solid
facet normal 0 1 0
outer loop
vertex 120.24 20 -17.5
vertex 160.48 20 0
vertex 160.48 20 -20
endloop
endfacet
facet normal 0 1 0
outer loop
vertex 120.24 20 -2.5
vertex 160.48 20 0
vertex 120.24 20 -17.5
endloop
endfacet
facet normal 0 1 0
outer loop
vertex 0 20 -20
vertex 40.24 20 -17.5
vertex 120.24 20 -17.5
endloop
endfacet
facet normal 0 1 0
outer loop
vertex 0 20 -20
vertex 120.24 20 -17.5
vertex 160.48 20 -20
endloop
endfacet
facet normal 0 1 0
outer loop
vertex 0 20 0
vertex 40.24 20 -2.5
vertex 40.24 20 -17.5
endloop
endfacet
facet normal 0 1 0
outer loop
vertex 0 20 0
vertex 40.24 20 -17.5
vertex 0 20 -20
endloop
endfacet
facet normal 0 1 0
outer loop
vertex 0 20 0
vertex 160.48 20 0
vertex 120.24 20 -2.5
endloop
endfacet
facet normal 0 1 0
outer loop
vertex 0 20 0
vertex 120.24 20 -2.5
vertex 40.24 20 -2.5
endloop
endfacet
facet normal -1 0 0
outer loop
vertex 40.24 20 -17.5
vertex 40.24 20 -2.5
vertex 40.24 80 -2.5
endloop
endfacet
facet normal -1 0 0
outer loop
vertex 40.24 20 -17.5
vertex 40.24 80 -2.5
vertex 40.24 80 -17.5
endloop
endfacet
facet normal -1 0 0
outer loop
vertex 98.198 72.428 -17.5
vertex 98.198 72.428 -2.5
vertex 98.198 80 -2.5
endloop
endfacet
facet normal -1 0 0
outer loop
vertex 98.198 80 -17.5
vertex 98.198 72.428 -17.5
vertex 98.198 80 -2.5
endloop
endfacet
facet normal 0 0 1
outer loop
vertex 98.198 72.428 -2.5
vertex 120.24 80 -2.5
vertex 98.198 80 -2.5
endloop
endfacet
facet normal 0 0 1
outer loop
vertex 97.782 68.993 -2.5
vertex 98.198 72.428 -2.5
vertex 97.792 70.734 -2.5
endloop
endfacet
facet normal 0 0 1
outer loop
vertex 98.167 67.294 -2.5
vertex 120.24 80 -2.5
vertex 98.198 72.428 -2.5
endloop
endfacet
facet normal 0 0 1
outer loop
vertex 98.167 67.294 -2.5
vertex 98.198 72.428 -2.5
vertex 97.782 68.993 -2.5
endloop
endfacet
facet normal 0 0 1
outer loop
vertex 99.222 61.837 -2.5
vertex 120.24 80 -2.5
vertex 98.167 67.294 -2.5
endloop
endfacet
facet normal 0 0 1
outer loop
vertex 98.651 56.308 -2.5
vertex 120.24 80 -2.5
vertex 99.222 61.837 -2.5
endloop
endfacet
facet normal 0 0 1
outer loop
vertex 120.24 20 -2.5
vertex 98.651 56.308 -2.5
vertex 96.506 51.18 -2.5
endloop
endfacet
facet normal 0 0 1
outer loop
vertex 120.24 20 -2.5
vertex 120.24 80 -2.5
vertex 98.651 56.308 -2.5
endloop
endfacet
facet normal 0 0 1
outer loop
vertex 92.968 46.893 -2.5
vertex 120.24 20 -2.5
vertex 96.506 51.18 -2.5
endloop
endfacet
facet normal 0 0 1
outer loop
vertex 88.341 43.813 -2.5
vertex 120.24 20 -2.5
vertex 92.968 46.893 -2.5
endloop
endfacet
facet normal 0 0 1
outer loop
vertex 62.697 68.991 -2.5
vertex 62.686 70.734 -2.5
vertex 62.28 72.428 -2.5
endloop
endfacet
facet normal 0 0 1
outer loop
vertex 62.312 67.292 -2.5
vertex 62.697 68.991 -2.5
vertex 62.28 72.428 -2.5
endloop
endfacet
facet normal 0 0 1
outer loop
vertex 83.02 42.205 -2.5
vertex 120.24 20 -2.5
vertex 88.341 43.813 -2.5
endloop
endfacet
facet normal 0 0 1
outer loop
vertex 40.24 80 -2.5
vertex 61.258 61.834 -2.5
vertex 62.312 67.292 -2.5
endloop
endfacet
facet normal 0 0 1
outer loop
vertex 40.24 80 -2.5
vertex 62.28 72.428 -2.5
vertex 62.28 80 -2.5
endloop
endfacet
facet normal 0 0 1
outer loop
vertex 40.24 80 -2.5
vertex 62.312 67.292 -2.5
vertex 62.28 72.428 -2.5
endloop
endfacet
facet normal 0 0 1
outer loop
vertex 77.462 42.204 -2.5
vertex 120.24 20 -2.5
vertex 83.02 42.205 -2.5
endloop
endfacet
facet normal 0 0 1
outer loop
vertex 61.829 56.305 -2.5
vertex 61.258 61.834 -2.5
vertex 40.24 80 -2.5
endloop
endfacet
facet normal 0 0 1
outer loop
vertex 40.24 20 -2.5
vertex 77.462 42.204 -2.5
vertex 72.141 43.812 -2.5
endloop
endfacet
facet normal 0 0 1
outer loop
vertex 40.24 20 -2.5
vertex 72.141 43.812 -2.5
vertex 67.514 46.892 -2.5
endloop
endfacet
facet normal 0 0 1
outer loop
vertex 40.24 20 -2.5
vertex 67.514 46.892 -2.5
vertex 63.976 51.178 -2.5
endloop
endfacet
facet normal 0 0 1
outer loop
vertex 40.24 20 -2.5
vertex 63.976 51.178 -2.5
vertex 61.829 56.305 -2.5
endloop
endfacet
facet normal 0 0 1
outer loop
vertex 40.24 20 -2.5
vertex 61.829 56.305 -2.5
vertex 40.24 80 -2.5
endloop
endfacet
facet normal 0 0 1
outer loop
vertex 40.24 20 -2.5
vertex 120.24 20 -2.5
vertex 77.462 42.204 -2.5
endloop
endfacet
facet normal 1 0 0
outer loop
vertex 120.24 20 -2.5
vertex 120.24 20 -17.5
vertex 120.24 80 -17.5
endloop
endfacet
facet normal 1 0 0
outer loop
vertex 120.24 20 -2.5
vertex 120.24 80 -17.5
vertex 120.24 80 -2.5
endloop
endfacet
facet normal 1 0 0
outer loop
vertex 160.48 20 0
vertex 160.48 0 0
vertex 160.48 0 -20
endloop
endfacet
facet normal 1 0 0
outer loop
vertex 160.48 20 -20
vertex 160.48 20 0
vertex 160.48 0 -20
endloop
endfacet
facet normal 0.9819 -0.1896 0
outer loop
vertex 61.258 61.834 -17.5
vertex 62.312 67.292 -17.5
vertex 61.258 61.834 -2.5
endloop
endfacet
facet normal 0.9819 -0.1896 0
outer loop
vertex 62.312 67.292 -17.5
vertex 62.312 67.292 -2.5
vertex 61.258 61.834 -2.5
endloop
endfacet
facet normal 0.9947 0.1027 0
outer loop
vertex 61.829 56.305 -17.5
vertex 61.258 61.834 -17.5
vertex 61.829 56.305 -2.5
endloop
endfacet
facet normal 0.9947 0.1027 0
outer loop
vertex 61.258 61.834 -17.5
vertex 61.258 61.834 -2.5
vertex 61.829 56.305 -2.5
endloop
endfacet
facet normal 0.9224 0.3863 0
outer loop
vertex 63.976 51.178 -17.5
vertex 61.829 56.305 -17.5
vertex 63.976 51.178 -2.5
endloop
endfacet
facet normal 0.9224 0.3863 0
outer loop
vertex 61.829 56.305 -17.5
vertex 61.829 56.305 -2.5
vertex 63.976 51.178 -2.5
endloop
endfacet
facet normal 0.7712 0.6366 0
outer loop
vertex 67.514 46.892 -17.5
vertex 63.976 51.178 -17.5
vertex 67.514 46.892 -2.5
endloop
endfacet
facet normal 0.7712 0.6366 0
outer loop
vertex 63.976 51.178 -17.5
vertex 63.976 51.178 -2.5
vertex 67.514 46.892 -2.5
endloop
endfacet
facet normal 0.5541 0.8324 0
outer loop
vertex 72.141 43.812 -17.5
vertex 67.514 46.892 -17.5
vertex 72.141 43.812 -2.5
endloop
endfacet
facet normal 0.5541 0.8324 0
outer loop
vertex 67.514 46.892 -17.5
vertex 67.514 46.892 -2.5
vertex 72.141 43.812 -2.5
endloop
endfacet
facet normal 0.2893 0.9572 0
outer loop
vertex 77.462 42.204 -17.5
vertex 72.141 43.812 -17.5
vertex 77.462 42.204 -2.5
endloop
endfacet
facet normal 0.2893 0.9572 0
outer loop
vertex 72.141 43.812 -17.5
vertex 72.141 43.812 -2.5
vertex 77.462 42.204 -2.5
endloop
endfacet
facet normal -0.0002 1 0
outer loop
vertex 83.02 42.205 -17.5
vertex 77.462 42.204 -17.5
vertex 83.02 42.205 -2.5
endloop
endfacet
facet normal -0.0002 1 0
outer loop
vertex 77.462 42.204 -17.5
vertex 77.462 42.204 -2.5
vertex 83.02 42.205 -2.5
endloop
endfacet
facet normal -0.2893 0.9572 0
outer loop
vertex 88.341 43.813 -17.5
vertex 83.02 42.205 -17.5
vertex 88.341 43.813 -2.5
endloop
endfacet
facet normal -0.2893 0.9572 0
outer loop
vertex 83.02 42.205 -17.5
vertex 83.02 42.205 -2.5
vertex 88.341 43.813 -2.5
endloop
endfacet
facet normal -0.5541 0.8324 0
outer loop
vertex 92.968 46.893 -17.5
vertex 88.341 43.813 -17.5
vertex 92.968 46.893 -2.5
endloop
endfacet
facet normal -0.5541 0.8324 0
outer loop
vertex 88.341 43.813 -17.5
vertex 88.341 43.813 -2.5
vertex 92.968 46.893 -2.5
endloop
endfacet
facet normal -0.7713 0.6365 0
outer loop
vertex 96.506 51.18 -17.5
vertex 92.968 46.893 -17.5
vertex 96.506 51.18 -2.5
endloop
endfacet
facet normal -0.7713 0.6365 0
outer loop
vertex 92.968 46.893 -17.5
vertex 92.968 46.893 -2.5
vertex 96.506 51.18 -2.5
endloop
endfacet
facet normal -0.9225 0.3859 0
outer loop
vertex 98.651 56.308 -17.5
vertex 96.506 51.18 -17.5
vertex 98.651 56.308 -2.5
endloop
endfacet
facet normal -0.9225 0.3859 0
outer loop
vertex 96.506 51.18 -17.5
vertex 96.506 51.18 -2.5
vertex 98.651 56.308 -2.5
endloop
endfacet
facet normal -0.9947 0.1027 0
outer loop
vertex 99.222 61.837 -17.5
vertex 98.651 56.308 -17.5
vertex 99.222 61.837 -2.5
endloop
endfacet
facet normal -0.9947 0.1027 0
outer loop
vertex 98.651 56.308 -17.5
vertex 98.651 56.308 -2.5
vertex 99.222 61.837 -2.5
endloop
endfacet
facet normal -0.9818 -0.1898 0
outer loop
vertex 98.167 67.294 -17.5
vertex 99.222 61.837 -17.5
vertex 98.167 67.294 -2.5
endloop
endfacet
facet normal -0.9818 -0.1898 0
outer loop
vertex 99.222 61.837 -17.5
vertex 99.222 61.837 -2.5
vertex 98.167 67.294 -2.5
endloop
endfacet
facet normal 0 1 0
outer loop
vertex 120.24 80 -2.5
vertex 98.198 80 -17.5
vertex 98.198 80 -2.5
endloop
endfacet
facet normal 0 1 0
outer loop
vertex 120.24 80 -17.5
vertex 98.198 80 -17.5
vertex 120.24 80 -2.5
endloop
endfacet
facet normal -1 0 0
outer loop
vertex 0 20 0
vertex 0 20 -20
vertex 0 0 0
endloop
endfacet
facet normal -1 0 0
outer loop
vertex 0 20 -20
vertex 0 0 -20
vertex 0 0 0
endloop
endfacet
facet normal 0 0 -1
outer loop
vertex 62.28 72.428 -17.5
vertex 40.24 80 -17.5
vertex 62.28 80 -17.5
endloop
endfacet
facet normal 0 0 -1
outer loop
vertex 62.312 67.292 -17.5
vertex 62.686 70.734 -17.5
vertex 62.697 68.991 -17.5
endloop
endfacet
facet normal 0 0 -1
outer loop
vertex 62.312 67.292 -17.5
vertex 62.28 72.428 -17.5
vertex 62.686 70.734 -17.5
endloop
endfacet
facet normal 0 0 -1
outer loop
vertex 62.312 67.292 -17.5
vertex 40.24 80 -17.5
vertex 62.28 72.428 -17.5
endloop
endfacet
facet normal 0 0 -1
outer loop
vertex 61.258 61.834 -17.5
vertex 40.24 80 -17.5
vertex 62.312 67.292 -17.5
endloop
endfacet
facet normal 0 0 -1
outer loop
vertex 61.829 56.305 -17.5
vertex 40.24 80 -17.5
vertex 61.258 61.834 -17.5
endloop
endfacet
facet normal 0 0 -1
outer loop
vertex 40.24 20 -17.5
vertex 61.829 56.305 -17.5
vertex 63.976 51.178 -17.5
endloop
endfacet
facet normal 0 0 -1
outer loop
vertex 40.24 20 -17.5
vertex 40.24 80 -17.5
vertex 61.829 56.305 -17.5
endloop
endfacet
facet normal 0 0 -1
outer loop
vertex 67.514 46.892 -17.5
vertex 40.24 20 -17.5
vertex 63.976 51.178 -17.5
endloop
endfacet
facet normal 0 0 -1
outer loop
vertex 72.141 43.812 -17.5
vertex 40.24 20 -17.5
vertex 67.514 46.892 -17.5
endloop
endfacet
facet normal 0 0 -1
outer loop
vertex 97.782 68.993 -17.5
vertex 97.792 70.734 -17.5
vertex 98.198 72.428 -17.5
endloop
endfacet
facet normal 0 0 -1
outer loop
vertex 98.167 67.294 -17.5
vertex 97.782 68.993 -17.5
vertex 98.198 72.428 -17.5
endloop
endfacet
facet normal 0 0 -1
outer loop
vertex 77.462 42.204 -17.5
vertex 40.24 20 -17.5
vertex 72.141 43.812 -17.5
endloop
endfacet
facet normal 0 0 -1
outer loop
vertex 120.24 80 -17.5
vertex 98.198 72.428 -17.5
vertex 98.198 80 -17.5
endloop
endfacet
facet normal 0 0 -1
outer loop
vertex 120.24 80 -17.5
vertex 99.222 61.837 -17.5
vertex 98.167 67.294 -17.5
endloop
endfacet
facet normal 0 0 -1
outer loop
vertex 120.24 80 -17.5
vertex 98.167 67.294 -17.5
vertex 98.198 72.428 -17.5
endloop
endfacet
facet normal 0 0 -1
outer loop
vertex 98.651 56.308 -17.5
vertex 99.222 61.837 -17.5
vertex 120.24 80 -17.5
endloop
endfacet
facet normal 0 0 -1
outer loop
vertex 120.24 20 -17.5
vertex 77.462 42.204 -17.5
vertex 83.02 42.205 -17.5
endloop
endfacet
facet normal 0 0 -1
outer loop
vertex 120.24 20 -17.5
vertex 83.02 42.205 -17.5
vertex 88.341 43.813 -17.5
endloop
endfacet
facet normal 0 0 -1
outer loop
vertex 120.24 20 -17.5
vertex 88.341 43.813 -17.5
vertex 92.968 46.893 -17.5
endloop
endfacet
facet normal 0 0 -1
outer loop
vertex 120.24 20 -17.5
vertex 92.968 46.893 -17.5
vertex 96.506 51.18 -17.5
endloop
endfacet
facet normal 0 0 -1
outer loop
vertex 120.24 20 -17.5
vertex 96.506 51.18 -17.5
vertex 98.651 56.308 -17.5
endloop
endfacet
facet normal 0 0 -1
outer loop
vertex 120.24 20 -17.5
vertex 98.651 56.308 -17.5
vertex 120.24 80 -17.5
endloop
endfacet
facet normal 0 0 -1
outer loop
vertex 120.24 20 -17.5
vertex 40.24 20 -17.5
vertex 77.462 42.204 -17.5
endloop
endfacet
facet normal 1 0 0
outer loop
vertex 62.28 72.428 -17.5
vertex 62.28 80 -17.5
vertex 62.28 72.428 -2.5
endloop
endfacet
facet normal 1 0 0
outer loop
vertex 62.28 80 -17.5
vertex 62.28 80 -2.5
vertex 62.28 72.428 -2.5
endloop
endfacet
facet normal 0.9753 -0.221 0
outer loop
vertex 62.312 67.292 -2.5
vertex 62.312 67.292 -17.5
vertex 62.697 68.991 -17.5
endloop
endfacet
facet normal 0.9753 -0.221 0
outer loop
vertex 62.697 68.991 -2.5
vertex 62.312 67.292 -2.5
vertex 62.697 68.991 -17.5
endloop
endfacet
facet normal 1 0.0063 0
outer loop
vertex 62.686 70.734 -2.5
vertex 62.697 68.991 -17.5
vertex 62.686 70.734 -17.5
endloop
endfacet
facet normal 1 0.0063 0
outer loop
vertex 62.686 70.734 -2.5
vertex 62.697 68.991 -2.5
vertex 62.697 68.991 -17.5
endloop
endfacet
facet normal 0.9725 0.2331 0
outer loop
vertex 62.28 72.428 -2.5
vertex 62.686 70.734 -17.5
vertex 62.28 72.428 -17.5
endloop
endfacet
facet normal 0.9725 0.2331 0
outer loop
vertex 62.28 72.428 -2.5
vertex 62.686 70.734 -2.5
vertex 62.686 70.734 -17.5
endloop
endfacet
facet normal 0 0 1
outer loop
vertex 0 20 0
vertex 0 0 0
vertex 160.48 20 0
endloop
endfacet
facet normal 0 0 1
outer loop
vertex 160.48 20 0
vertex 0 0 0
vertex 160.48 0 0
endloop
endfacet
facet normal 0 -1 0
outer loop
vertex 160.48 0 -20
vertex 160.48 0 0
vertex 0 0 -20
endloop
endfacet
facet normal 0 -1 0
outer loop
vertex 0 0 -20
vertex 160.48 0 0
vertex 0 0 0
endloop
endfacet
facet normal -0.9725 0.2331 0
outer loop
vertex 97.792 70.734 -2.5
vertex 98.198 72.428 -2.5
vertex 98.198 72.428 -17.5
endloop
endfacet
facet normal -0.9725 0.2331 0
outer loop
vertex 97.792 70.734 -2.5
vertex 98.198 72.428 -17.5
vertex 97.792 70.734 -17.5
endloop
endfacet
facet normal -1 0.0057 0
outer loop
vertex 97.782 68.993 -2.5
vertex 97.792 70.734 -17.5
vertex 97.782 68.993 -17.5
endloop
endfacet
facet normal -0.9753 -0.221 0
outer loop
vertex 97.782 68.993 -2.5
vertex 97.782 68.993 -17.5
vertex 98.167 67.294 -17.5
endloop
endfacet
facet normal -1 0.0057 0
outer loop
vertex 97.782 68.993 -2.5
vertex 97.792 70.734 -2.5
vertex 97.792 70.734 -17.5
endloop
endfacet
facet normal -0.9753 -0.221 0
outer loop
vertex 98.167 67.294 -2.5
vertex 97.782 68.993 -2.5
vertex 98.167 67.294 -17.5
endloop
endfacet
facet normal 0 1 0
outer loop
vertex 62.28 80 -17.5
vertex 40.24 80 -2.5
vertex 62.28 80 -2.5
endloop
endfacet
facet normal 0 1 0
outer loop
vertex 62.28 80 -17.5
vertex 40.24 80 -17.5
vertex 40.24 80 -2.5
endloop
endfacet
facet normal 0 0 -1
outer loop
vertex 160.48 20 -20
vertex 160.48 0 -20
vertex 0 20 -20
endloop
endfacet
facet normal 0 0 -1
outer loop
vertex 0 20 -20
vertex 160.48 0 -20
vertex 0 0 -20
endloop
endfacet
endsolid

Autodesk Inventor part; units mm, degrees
ref_plane "YZ Plane" through (0, 0, 0) normal (1, 0, 0) x (0, 1, 0)
ref_plane "XZ Plane" through (0, 0, 0) normal (0, 1, 0) x (-1, 0, 0)
ref_plane "XY Plane" through (0, 0, 0) normal (0, 0, 1) x (1, 0, 0)
sketch "Sketch1" plane through (0, 0, 0) normal (0, 1, 0) x (-1, 0, 0)
  line L0 (0, 0) -> (-160.48, 0)
  line L1 (-160.48, 0) -> (-160.48, -20)
  line L2 (-160.48, -20) -> (0, -20)
  line L3 (0, -20) -> (0, 0)
  dimension "d0" = 160.48
  dimension "d1" = 20
extrude "Extrusion1" add sketch "Sketch1" along normal blind 20
sketch "Sketch2" plane through (0, 20, 0) normal (0, 1, 0) x (1, 0, 0)
  line L0 (40.24, 17.5) -> (120.24, 17.5)
  line L1 (120.24, 17.5) -> (120.24, 2.5)
  line L2 (120.24, 2.5) -> (40.24, 2.5)
  line L3 (40.24, 2.5) -> (40.24, 17.5)
  line L4 (160.48, 20) -> (0, 20) projected
  line L5 (160.48, 0) -> (160.48, 20) projected
  point P0 (0, 0)
  point P1 (80.24, 17.5)
  point P2 (80.24, 20)
  point P3 (160.48, 10)
  point P4 (120.24, 10)
  dimension "d4" = 80
  dimension "d5" = 15
extrude "Extrusion2" add sketch "Sketch2" along normal blind 60
sketch "Sketch3" plane through (40.24, 20, -2.5) normal (0, 0, 1) x (1, 0, 0)
  circle A0 centre (40, 41) radius 19
  line L0 (0, 60) -> (80, 60) projected
  point P0 (-40.24, -20)
  point P1 (40, 60)
  dimension "d8" = 38
  dimension "d9" = 19
extrude "Extrusion3" cut sketch "Sketch3" against normal blind 15
sketch "Sketch4" plane through (40.24, 20, -2.5) normal (0, 0, 1) x (1, 0, 0)
  line L0 (22.0399, 60) -> (22.0399, 52.4283)
  line L1 (22.0399, 52.4283) -> (24.8213, 52.4283)
  circle A0 centre (40, 41) radius 19 projected
  line L2 (40, 60) -> (22.0399, 60)
  arc A1 (40, 60) -> (24.8213, 52.4283) centre (40, 41) ccw
  point P0 (-40.24, -20)
  dimension "d12" = 7.5717
  dimension "d13" = 17.9601
extrude "Extrusion4" cut sketch "Sketch4" against normal blind 15 contours L2 A0 L1 L0
sketch "Sketch5" plane through (40.24, 20, -2.5) normal (0, 0, 1) x (1, 0, 0)
  arc A0 (24.8213, 52.4283) -> (40, 60) centre (40, 41) ccw projected
  line L0 (55.1787, 52.4283) -> (57.9578, 52.4283)
  line L1 (57.9578, 52.4283) -> (57.9578, 60)
  line L2 (57.9578, 60) -> (40, 60)
  line L3 (80, 60) -> (40, 60) projected
  arc A1 (55.1787, 52.4283) -> (40, 60) centre (40, 41) ccw
  point P0 (-40.24, -20)
  dimension "d16" = 17.9578
  dimension "d17" = 2.7791
  dimension "d18" = 7.5717
extrude "Extrusion5" cut sketch "Sketch5" against normal blind 15
fillet "Fillet1" radius 7.62 1 edges at (95.4187, 72.4283, -10)
fillet "Fillet2" radius 7.62 1 edges at (65.0613, 72.4283, -10)
properties part number "OpticalDeviceLensHolder"
